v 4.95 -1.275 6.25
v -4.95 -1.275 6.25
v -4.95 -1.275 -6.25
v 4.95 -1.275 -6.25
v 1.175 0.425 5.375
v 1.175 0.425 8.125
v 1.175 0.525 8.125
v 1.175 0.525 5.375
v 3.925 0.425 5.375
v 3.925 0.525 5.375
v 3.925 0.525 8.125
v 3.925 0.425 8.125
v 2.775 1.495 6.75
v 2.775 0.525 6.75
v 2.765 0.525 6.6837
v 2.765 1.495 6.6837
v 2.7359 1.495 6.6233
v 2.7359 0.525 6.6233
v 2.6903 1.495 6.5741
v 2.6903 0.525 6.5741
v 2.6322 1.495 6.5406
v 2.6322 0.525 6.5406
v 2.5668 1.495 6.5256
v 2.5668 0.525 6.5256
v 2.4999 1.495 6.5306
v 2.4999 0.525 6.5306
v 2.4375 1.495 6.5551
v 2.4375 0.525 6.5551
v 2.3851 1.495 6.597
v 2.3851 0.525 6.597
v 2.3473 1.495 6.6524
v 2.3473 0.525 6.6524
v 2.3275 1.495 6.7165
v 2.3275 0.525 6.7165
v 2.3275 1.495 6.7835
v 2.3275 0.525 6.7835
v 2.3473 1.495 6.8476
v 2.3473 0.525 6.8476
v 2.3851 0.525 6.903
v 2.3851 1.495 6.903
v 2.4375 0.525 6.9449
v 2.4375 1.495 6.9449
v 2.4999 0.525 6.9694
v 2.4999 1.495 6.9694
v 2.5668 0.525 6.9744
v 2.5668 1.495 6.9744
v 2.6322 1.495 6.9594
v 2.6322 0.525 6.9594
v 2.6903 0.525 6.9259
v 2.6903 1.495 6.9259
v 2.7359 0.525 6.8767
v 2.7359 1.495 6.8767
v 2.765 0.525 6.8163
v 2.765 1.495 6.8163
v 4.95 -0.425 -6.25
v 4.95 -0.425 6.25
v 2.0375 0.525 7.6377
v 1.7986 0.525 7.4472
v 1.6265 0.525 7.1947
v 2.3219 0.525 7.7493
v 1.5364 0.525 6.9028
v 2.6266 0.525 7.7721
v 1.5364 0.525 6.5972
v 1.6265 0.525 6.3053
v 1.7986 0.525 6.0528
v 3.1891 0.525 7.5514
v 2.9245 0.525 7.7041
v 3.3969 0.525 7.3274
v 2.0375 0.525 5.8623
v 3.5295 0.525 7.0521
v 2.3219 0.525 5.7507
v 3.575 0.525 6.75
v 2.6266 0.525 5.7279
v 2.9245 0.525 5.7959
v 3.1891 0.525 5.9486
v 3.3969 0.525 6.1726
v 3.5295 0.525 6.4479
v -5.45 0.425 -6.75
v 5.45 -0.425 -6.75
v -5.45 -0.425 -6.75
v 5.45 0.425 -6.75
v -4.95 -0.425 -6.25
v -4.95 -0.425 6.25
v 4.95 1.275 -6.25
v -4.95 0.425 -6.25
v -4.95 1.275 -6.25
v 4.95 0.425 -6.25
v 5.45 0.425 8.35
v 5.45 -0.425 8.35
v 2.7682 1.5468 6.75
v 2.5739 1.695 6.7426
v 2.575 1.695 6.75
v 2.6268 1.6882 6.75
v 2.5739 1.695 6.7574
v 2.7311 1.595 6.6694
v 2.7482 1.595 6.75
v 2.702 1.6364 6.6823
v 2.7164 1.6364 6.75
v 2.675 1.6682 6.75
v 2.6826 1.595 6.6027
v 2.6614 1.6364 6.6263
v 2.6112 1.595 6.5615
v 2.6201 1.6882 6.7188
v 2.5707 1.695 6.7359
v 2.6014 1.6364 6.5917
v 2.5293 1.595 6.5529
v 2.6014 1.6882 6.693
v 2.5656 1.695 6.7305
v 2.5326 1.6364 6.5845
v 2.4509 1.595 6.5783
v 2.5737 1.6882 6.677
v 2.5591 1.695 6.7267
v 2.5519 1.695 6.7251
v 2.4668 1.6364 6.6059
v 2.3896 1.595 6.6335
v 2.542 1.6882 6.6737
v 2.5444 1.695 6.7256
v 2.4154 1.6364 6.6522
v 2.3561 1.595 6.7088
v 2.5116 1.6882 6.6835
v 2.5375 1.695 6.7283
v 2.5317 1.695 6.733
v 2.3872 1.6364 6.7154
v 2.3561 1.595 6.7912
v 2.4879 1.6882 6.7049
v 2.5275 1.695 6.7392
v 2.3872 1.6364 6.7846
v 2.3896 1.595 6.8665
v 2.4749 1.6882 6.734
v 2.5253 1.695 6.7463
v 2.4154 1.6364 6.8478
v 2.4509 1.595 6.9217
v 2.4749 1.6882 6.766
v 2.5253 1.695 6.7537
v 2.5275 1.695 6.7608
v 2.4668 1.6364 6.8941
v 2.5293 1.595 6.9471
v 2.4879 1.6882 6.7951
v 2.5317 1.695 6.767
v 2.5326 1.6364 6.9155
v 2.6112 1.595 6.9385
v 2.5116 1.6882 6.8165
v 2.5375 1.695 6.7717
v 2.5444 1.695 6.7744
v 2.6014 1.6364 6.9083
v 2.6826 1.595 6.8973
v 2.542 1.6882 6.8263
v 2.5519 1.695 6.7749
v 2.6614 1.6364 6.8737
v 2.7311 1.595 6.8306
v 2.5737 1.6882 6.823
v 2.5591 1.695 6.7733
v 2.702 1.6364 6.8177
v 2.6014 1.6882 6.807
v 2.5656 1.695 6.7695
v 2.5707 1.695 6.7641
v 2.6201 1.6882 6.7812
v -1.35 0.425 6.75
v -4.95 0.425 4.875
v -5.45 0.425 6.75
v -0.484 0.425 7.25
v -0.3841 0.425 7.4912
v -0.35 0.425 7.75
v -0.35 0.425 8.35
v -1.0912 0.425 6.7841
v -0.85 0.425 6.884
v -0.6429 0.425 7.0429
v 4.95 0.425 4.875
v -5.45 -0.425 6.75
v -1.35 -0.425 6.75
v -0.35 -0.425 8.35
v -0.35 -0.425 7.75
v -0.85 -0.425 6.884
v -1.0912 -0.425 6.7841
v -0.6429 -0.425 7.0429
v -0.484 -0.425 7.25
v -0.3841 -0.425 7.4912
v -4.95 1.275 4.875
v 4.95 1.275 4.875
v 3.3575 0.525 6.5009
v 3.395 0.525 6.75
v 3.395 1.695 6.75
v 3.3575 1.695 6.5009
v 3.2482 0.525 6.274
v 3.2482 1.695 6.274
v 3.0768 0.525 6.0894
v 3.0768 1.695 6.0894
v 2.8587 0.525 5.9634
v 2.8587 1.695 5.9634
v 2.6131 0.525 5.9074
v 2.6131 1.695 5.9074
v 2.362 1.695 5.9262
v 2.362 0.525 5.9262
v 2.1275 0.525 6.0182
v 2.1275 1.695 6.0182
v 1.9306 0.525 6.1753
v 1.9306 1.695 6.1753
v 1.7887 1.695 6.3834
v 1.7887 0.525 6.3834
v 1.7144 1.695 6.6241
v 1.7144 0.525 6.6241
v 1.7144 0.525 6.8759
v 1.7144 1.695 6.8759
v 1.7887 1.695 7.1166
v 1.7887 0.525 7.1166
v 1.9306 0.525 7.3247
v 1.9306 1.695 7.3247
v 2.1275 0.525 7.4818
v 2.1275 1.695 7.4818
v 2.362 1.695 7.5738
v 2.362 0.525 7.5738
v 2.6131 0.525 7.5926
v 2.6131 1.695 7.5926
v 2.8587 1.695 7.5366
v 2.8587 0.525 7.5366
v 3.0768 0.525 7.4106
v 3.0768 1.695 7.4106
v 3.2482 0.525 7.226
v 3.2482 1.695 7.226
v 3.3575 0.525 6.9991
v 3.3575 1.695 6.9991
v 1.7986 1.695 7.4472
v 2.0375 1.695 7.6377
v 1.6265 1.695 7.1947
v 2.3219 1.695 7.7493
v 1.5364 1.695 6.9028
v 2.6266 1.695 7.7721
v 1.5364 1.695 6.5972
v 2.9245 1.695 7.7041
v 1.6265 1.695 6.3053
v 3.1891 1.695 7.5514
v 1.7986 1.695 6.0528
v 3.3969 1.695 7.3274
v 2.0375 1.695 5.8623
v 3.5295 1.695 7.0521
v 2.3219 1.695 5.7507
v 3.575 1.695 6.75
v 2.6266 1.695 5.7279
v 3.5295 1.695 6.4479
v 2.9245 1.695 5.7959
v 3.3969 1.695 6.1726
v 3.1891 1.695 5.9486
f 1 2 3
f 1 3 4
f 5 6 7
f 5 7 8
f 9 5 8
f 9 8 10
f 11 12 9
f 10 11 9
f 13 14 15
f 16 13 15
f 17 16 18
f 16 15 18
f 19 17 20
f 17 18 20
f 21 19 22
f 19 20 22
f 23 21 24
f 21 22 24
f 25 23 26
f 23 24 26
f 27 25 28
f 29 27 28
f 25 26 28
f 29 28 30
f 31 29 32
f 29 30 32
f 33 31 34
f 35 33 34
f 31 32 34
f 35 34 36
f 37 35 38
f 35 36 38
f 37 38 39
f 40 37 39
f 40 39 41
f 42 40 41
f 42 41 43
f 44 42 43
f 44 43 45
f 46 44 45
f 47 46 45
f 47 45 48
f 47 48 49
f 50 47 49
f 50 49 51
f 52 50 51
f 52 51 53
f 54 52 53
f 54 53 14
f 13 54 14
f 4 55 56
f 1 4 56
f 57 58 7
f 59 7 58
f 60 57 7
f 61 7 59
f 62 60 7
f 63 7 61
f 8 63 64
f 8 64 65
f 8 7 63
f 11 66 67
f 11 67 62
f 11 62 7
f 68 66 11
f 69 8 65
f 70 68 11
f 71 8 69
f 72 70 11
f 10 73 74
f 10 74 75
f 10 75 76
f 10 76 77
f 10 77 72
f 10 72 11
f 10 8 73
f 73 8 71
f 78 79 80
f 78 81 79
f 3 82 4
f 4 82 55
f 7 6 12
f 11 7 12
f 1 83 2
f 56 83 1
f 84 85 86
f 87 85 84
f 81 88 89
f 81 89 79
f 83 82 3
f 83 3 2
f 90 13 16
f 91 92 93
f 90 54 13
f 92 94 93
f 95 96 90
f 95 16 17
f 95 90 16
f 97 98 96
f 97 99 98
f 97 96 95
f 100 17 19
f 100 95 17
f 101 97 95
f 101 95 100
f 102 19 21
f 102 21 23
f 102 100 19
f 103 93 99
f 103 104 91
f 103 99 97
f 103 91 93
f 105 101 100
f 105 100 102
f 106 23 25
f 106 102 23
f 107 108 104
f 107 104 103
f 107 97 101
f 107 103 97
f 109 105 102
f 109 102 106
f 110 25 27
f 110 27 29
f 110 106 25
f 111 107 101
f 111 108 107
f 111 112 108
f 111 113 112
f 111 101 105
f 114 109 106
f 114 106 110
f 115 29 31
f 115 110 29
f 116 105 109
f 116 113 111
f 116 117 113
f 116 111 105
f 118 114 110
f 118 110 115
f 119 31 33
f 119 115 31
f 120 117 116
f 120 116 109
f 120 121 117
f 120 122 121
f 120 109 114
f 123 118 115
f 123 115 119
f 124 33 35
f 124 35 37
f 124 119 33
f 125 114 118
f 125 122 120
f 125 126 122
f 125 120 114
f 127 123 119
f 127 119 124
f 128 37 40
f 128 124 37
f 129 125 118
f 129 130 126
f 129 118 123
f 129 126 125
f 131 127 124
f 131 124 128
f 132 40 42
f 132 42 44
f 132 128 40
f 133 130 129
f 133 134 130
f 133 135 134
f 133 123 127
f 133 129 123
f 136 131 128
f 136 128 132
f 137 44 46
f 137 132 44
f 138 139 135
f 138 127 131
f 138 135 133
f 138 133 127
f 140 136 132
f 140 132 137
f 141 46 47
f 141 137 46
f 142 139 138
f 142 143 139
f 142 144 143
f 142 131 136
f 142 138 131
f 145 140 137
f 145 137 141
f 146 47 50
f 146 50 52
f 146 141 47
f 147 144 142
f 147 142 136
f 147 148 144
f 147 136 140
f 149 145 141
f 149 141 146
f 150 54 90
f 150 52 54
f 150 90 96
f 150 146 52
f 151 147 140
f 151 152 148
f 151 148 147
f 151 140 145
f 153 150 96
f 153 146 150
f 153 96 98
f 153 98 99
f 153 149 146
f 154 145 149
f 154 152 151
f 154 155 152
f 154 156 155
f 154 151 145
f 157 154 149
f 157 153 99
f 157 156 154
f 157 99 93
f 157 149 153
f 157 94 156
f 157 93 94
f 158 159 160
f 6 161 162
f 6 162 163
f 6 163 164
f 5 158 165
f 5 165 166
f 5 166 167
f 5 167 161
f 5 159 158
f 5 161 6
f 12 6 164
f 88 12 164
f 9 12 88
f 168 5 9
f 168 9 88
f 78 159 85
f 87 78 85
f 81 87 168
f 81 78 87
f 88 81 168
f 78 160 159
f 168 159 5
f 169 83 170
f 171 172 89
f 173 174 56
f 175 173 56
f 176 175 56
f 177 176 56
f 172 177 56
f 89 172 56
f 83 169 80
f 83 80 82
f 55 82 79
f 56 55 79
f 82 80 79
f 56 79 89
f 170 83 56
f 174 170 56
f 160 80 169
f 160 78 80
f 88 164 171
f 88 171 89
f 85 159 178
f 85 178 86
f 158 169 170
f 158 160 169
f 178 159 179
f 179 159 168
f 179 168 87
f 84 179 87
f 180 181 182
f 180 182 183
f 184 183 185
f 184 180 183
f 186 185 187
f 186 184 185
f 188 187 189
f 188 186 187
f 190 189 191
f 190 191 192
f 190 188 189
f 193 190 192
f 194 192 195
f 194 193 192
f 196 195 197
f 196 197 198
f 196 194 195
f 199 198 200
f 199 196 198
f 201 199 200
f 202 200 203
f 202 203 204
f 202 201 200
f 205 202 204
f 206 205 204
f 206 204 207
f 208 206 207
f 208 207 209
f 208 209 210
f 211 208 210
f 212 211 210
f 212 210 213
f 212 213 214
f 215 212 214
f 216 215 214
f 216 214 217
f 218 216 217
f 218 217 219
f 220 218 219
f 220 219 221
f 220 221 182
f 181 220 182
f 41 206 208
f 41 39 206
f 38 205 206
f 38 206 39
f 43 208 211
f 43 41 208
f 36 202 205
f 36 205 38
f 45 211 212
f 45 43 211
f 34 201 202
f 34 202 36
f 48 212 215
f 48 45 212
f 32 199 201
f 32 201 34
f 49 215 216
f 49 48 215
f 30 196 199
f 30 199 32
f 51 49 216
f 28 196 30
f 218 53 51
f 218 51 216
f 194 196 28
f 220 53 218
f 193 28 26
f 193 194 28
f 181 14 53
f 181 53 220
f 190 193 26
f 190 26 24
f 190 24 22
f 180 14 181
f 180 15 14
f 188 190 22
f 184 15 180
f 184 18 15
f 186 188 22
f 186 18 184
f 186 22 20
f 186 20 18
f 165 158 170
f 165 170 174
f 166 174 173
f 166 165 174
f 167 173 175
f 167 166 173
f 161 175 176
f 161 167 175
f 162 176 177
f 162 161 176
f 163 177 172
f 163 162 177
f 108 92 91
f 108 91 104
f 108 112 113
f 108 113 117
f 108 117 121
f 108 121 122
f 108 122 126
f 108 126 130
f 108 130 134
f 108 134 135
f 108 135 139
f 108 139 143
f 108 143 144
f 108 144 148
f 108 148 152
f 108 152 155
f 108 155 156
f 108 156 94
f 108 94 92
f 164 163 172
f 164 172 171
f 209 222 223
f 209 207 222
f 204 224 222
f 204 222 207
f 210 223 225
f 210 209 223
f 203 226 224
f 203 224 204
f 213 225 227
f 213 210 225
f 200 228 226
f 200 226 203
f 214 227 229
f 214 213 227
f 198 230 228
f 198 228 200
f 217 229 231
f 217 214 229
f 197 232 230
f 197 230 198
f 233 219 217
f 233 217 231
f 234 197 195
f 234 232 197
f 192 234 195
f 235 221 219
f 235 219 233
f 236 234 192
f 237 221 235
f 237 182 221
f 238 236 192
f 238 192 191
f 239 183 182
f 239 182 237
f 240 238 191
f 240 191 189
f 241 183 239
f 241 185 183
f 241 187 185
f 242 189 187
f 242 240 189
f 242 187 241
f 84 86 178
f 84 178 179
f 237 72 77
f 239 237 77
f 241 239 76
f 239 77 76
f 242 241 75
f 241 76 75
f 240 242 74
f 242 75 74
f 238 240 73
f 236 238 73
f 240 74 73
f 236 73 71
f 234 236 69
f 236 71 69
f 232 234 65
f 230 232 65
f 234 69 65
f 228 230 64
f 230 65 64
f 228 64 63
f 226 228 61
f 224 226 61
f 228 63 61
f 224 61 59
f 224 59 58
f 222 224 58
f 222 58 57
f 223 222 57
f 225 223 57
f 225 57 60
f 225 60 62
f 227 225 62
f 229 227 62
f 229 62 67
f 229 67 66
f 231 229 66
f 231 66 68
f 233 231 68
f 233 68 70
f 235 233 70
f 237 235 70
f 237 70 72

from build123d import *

# Parameters (mm, degrees)
BOSS_EXTRUDE1_DEPTH = 0.425
SKETCH2_W           = 2.75
SKETCH2_H           = 2.75
BOSS_EXTRUDE2_DEPTH = 0.1
BOSS_EXTRUDE3_START = -0.95
SKETCH3_R           = 1.025
SKETCH3_R_2         = 0.845
SKETCH3_R_3         = 0.225
BOSS_EXTRUDE3_DEPTH = 2.12
FILLET1_R           = 0.2
BOSS_EXTRUDE4_START = -0.85
SKETCH4_W           = 9.9
SKETCH4_H           = 12.5
BOSS_EXTRUDE4_DEPTH = 1.7
BOSS_EXTRUDE5_START = -0.85
SKETCH5_W           = 9.9
SKETCH5_H           = 11.125
BOSS_EXTRUDE5_DEPTH = 1.7


with BuildPart() as part:
    # Sketch1 → Boss-Extrude1 (new body, symmetric)
    with BuildSketch(Plane(origin=(0, 0, 0), x_dir=(1, 0, 0), z_dir=(0, 1, 0))):
        with BuildLine():
            Line((-5.45, -6.75), (-1.35, -6.75))
            ThreePointArc((-1.35, -6.75), (-0.642893219, -7.042893219), (-0.35, -7.75))
            Line((-0.35, -7.75), (-0.35, -8.35))
            Line((-0.35, -8.35), (5.45, -8.35))
            Line((5.45, -8.35), (5.45, -6.75))
            Line((5.45, -6.75), (5.45, 6.75))
            Line((5.45, 6.75), (-5.45, 6.75))
            Line((-5.45, 6.75), (-5.45, -6.75))
        make_face()
    extrude(amount=BOSS_EXTRUDE1_DEPTH, both=True)

    # Sketch2 → Boss-Extrude2 (add)
    with BuildSketch(Plane(origin=(0, 0.425, 0), x_dir=(1, 0, 0), z_dir=(0, 1, 0))):
        with Locations((2.55, -6.75)):
            Rectangle(SKETCH2_W, SKETCH2_H)
    extrude(amount=BOSS_EXTRUDE2_DEPTH)

    # Sketch3 → Boss-Extrude3 (add)
    with BuildSketch(Plane(origin=(0, 0.525, 0), x_dir=(1, 0, 0), z_dir=(0, 1, 0)).offset(BOSS_EXTRUDE3_START)):
        with Locations((2.55, -6.75)):
            Circle(SKETCH3_R)
        with Locations((2.55, -6.75)):
            Circle(SKETCH3_R_2, mode=Mode.SUBTRACT)
        with Locations((2.55, -6.75)):
            Circle(SKETCH3_R_3)
    extrude(amount=BOSS_EXTRUDE3_DEPTH)

    # Fillet1
    fillet1_edges = [part.edges().sort_by_distance(p)[0] for p in [
        (2.325, 1.695, 6.75),
    ]]
    fillet(fillet1_edges, radius=FILLET1_R)

    # Sketch4 → Boss-Extrude4 (add)
    with BuildSketch(Plane.XZ.offset(0.425).offset(BOSS_EXTRUDE4_START)):
        Rectangle(SKETCH4_W, SKETCH4_H)
    extrude(amount=BOSS_EXTRUDE4_DEPTH)

    # Sketch5 → Boss-Extrude5 (add)
    with BuildSketch(Plane(origin=(0, 0.425, 0), x_dir=(1, 0, 0), z_dir=(0, 1, 0)).offset(BOSS_EXTRUDE5_START)):
        with Locations((0, 0.6875)):
            Rectangle(SKETCH5_W, SKETCH5_H)
    extrude(amount=BOSS_EXTRUDE5_DEPTH)


solid = part.part
